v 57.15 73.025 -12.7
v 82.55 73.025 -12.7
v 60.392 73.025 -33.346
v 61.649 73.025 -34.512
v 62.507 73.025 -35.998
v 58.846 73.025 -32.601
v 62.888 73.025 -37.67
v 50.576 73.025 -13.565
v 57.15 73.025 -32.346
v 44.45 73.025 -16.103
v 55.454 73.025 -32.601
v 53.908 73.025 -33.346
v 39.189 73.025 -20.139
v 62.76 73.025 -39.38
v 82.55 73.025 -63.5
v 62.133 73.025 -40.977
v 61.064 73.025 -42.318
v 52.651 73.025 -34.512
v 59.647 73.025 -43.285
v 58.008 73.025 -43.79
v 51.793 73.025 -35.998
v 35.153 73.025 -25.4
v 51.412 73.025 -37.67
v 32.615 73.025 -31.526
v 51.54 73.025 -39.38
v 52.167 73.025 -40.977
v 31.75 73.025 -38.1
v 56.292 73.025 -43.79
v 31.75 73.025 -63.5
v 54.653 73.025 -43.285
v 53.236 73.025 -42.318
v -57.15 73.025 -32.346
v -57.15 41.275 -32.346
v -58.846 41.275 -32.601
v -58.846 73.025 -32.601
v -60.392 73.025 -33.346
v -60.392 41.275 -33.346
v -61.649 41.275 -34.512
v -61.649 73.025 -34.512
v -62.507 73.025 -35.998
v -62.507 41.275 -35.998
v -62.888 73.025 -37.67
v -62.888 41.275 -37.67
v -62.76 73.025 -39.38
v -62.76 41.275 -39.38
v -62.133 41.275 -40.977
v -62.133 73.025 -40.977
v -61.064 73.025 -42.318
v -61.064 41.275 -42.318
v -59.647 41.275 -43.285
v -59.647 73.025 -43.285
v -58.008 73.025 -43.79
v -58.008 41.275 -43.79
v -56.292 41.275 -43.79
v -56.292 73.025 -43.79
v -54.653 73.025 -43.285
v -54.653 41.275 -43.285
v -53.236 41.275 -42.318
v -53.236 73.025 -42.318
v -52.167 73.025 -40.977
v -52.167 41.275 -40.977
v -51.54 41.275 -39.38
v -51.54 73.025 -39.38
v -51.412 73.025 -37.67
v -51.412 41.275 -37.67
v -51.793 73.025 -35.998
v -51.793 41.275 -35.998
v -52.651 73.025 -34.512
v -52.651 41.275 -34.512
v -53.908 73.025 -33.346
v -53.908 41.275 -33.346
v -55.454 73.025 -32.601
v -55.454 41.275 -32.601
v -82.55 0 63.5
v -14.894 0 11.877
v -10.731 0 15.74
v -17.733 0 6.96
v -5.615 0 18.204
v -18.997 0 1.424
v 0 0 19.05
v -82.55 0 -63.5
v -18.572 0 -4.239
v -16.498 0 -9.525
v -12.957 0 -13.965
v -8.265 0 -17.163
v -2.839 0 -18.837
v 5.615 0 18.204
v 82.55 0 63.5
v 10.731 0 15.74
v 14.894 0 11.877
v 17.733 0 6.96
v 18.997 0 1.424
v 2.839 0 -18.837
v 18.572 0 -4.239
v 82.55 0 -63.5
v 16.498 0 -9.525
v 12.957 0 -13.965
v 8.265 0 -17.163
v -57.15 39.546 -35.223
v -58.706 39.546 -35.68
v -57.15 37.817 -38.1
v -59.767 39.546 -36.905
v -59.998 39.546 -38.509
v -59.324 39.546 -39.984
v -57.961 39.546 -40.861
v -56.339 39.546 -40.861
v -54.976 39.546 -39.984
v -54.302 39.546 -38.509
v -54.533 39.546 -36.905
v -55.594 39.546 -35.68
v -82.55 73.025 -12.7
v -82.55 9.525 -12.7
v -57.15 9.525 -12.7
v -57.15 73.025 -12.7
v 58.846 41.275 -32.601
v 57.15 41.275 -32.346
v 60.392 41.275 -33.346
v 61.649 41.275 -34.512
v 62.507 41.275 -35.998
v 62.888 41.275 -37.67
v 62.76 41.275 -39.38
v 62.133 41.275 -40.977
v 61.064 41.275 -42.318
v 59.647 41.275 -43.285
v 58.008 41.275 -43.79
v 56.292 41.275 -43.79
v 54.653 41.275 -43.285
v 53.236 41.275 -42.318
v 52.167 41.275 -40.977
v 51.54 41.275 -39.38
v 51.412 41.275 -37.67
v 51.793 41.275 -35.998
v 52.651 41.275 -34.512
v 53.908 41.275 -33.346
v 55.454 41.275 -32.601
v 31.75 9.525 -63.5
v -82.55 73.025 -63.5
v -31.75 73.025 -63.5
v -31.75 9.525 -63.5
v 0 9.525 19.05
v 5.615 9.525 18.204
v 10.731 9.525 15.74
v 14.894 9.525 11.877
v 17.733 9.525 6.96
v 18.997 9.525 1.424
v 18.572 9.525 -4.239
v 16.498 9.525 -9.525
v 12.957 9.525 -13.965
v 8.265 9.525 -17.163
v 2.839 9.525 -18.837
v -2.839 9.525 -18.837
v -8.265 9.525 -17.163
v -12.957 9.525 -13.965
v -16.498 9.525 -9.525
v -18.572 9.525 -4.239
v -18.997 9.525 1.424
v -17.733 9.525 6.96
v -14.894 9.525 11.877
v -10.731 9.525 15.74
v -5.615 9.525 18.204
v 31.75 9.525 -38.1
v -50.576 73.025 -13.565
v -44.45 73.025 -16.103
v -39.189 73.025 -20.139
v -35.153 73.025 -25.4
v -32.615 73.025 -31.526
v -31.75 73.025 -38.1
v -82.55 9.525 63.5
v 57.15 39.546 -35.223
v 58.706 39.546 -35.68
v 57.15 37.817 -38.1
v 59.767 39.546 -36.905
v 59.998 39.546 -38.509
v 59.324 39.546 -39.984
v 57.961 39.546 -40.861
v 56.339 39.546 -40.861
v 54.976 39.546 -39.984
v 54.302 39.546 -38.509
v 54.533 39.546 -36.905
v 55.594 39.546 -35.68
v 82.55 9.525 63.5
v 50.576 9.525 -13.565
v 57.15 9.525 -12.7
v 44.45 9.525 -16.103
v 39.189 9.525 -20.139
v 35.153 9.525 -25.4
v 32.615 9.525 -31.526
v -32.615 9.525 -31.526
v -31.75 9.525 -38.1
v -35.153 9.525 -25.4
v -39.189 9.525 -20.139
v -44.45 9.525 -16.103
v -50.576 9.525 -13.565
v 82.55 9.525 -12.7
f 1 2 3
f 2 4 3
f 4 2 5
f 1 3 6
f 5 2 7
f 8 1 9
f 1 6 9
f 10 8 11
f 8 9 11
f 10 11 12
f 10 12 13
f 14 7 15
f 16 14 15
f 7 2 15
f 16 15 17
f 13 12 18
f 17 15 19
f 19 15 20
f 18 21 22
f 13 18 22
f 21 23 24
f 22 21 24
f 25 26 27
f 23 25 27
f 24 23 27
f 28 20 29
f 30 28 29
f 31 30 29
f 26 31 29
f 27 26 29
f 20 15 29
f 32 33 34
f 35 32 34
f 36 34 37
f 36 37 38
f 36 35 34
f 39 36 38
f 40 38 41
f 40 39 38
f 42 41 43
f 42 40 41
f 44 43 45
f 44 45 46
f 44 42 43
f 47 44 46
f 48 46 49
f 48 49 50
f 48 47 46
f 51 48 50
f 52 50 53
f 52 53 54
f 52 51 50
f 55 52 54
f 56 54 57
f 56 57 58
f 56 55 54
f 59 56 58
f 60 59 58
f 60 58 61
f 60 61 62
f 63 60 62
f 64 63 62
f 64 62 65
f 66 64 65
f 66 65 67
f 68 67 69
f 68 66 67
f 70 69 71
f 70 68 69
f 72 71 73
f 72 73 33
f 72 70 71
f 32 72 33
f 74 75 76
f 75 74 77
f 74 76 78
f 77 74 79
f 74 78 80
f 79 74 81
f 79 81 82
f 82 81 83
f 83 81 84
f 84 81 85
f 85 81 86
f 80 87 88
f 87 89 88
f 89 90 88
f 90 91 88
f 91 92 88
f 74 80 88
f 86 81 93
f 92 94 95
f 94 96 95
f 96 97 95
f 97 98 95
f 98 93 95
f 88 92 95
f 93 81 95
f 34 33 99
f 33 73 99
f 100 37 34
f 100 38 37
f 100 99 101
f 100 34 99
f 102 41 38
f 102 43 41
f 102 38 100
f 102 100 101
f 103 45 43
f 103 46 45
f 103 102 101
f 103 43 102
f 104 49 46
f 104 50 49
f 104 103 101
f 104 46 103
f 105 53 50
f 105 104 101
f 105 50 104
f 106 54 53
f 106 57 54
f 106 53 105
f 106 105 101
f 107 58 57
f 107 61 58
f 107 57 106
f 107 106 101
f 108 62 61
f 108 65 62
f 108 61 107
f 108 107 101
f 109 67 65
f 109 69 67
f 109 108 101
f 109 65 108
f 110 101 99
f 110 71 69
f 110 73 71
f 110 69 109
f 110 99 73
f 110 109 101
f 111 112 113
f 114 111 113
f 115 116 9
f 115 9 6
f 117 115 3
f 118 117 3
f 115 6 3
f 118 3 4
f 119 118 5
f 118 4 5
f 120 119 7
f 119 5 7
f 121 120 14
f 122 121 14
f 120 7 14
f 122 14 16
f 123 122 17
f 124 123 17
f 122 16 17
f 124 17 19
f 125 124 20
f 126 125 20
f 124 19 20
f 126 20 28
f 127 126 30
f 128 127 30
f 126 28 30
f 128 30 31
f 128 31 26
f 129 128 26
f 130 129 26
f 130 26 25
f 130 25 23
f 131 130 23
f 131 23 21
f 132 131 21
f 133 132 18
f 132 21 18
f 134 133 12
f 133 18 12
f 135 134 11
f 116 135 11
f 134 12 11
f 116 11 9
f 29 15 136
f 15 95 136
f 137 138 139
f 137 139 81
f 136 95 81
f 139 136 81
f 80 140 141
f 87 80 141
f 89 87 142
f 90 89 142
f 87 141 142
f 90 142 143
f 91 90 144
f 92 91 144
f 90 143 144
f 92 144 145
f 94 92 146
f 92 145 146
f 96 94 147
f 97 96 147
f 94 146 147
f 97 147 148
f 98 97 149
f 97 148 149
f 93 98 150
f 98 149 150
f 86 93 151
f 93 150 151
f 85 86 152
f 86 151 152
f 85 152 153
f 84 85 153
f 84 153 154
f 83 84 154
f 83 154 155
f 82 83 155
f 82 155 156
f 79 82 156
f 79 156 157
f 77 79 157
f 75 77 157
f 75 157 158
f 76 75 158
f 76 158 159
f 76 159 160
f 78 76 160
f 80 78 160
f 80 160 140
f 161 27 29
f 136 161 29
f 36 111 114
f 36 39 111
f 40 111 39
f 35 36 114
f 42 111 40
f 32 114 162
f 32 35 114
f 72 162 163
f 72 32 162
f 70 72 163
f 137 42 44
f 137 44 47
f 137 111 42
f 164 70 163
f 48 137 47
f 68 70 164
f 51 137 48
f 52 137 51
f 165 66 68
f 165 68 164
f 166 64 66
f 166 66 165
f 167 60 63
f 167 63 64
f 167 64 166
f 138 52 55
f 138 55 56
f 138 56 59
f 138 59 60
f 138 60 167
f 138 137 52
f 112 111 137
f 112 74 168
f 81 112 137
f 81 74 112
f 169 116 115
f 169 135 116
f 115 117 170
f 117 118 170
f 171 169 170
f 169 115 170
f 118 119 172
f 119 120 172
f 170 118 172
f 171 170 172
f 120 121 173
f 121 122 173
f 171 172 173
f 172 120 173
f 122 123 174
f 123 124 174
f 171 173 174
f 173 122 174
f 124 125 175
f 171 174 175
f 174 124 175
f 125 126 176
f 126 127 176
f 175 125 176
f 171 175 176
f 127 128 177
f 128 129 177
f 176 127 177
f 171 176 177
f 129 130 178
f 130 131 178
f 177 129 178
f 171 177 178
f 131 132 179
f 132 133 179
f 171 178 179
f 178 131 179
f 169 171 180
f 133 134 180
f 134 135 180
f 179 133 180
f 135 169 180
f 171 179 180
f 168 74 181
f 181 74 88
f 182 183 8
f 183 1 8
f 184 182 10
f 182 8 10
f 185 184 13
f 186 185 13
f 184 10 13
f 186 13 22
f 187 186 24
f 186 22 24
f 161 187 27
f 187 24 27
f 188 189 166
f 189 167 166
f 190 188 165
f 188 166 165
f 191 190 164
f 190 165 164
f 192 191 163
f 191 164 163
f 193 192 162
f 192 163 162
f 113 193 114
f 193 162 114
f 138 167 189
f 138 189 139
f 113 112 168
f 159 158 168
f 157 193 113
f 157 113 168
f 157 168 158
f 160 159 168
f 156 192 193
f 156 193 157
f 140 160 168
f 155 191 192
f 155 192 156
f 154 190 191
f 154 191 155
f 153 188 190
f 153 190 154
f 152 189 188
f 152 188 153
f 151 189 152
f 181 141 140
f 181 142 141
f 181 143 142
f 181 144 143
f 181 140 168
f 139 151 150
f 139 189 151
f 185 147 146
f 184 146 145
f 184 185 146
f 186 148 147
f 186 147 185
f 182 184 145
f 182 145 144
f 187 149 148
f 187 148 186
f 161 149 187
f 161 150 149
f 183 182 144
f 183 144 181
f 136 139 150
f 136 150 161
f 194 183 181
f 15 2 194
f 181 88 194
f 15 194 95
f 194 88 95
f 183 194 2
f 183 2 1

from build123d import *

# Parameters (mm, degrees)
SKETCH1_W              = 165.1
SKETCH1_H              = 127
BASE_EXTRUDE_DEPTH     = 9.525
SKETCH2_R              = 19.05
CENTER_HOLE_DEPTH      = 105.582398734
SKETCH3_W              = 50.8
SKETCH3_H              = 50.8
TOWER_EXTRUDE_DEPTH    = 63.5
FILLET_2_R             = 25.4
FILLET_2_OF_MIRROR_2_R = 25.4


with BuildPart() as part:
    # Sketch1 → Base Extrude (new body)
    with BuildSketch(Plane(origin=(0, 0, 0), x_dir=(1, 0, 0), z_dir=(0, 1, 0))):
        Rectangle(SKETCH1_W, SKETCH1_H)
    extrude(amount=BASE_EXTRUDE_DEPTH)

    # Sketch2 → Center Hole (cut, through all)
    with BuildSketch(Plane(origin=(0, 9.525, 0), x_dir=(1, 0, 0), z_dir=(0, 1, 0))):
        with Locations(Location((0, 0, 0), (0, 0, 270))):
            Circle(SKETCH2_R)
    extrude(amount=-CENTER_HOLE_DEPTH, mode=Mode.SUBTRACT)

    # Sketch3 → Tower Extrude (add)
    with BuildSketch(Plane(origin=(0, 9.525, 0), x_dir=(1, 0, 0), z_dir=(0, 1, 0))):
        with Locations((-57.15, 38.1)):
            Rectangle(SKETCH3_W, SKETCH3_H)
    tower_extrude = extrude(amount=TOWER_EXTRUDE_DEPTH)

    # Fillet 2
    fillet_2_edges = [part.edges().sort_by_distance(p)[0] for p in [
        (-31.75, 41.275, -12.7),
    ]]
    fillet(fillet_2_edges, radius=FILLET_2_R)

    # Sketch7 → 1/2-20 Tapped Hole (revolve, cut)
    with BuildSketch(Plane(origin=(-57.15, 73.025, -38.1), x_dir=(0, 0, 1), z_dir=(1, 0, 0))):
        Polygon((0, 0), (0, 35.20757432), (5.75437, 31.75), (5.75437, 0), align=None)
    f_1_2_20_tapped_hole = revolve(axis=Axis((-57.15, 79.375, -38.1), (0, -1, 0)), mode=Mode.SUBTRACT)

    # Mirror 2: Tower Extrude, 1/2-20 Tapped Hole across plane
    add(tower_extrude.mirror(Plane(origin=(0, 0, 0), x_dir=(0, 0, 1), z_dir=(1, 0, 0))))
    add(f_1_2_20_tapped_hole.mirror(Plane(origin=(0, 0, 0), x_dir=(0, 0, 1), z_dir=(1, 0, 0))), mode=Mode.SUBTRACT)

    # Fillet 2 of Mirror 2
    fillet_2_of_mirror_2_edges = [part.edges().sort_by_distance(p)[0] for p in [
        (31.75, 41.275, -12.7),
    ]]
    fillet(fillet_2_of_mirror_2_edges, radius=FILLET_2_OF_MIRROR_2_R)


solid = part.part
